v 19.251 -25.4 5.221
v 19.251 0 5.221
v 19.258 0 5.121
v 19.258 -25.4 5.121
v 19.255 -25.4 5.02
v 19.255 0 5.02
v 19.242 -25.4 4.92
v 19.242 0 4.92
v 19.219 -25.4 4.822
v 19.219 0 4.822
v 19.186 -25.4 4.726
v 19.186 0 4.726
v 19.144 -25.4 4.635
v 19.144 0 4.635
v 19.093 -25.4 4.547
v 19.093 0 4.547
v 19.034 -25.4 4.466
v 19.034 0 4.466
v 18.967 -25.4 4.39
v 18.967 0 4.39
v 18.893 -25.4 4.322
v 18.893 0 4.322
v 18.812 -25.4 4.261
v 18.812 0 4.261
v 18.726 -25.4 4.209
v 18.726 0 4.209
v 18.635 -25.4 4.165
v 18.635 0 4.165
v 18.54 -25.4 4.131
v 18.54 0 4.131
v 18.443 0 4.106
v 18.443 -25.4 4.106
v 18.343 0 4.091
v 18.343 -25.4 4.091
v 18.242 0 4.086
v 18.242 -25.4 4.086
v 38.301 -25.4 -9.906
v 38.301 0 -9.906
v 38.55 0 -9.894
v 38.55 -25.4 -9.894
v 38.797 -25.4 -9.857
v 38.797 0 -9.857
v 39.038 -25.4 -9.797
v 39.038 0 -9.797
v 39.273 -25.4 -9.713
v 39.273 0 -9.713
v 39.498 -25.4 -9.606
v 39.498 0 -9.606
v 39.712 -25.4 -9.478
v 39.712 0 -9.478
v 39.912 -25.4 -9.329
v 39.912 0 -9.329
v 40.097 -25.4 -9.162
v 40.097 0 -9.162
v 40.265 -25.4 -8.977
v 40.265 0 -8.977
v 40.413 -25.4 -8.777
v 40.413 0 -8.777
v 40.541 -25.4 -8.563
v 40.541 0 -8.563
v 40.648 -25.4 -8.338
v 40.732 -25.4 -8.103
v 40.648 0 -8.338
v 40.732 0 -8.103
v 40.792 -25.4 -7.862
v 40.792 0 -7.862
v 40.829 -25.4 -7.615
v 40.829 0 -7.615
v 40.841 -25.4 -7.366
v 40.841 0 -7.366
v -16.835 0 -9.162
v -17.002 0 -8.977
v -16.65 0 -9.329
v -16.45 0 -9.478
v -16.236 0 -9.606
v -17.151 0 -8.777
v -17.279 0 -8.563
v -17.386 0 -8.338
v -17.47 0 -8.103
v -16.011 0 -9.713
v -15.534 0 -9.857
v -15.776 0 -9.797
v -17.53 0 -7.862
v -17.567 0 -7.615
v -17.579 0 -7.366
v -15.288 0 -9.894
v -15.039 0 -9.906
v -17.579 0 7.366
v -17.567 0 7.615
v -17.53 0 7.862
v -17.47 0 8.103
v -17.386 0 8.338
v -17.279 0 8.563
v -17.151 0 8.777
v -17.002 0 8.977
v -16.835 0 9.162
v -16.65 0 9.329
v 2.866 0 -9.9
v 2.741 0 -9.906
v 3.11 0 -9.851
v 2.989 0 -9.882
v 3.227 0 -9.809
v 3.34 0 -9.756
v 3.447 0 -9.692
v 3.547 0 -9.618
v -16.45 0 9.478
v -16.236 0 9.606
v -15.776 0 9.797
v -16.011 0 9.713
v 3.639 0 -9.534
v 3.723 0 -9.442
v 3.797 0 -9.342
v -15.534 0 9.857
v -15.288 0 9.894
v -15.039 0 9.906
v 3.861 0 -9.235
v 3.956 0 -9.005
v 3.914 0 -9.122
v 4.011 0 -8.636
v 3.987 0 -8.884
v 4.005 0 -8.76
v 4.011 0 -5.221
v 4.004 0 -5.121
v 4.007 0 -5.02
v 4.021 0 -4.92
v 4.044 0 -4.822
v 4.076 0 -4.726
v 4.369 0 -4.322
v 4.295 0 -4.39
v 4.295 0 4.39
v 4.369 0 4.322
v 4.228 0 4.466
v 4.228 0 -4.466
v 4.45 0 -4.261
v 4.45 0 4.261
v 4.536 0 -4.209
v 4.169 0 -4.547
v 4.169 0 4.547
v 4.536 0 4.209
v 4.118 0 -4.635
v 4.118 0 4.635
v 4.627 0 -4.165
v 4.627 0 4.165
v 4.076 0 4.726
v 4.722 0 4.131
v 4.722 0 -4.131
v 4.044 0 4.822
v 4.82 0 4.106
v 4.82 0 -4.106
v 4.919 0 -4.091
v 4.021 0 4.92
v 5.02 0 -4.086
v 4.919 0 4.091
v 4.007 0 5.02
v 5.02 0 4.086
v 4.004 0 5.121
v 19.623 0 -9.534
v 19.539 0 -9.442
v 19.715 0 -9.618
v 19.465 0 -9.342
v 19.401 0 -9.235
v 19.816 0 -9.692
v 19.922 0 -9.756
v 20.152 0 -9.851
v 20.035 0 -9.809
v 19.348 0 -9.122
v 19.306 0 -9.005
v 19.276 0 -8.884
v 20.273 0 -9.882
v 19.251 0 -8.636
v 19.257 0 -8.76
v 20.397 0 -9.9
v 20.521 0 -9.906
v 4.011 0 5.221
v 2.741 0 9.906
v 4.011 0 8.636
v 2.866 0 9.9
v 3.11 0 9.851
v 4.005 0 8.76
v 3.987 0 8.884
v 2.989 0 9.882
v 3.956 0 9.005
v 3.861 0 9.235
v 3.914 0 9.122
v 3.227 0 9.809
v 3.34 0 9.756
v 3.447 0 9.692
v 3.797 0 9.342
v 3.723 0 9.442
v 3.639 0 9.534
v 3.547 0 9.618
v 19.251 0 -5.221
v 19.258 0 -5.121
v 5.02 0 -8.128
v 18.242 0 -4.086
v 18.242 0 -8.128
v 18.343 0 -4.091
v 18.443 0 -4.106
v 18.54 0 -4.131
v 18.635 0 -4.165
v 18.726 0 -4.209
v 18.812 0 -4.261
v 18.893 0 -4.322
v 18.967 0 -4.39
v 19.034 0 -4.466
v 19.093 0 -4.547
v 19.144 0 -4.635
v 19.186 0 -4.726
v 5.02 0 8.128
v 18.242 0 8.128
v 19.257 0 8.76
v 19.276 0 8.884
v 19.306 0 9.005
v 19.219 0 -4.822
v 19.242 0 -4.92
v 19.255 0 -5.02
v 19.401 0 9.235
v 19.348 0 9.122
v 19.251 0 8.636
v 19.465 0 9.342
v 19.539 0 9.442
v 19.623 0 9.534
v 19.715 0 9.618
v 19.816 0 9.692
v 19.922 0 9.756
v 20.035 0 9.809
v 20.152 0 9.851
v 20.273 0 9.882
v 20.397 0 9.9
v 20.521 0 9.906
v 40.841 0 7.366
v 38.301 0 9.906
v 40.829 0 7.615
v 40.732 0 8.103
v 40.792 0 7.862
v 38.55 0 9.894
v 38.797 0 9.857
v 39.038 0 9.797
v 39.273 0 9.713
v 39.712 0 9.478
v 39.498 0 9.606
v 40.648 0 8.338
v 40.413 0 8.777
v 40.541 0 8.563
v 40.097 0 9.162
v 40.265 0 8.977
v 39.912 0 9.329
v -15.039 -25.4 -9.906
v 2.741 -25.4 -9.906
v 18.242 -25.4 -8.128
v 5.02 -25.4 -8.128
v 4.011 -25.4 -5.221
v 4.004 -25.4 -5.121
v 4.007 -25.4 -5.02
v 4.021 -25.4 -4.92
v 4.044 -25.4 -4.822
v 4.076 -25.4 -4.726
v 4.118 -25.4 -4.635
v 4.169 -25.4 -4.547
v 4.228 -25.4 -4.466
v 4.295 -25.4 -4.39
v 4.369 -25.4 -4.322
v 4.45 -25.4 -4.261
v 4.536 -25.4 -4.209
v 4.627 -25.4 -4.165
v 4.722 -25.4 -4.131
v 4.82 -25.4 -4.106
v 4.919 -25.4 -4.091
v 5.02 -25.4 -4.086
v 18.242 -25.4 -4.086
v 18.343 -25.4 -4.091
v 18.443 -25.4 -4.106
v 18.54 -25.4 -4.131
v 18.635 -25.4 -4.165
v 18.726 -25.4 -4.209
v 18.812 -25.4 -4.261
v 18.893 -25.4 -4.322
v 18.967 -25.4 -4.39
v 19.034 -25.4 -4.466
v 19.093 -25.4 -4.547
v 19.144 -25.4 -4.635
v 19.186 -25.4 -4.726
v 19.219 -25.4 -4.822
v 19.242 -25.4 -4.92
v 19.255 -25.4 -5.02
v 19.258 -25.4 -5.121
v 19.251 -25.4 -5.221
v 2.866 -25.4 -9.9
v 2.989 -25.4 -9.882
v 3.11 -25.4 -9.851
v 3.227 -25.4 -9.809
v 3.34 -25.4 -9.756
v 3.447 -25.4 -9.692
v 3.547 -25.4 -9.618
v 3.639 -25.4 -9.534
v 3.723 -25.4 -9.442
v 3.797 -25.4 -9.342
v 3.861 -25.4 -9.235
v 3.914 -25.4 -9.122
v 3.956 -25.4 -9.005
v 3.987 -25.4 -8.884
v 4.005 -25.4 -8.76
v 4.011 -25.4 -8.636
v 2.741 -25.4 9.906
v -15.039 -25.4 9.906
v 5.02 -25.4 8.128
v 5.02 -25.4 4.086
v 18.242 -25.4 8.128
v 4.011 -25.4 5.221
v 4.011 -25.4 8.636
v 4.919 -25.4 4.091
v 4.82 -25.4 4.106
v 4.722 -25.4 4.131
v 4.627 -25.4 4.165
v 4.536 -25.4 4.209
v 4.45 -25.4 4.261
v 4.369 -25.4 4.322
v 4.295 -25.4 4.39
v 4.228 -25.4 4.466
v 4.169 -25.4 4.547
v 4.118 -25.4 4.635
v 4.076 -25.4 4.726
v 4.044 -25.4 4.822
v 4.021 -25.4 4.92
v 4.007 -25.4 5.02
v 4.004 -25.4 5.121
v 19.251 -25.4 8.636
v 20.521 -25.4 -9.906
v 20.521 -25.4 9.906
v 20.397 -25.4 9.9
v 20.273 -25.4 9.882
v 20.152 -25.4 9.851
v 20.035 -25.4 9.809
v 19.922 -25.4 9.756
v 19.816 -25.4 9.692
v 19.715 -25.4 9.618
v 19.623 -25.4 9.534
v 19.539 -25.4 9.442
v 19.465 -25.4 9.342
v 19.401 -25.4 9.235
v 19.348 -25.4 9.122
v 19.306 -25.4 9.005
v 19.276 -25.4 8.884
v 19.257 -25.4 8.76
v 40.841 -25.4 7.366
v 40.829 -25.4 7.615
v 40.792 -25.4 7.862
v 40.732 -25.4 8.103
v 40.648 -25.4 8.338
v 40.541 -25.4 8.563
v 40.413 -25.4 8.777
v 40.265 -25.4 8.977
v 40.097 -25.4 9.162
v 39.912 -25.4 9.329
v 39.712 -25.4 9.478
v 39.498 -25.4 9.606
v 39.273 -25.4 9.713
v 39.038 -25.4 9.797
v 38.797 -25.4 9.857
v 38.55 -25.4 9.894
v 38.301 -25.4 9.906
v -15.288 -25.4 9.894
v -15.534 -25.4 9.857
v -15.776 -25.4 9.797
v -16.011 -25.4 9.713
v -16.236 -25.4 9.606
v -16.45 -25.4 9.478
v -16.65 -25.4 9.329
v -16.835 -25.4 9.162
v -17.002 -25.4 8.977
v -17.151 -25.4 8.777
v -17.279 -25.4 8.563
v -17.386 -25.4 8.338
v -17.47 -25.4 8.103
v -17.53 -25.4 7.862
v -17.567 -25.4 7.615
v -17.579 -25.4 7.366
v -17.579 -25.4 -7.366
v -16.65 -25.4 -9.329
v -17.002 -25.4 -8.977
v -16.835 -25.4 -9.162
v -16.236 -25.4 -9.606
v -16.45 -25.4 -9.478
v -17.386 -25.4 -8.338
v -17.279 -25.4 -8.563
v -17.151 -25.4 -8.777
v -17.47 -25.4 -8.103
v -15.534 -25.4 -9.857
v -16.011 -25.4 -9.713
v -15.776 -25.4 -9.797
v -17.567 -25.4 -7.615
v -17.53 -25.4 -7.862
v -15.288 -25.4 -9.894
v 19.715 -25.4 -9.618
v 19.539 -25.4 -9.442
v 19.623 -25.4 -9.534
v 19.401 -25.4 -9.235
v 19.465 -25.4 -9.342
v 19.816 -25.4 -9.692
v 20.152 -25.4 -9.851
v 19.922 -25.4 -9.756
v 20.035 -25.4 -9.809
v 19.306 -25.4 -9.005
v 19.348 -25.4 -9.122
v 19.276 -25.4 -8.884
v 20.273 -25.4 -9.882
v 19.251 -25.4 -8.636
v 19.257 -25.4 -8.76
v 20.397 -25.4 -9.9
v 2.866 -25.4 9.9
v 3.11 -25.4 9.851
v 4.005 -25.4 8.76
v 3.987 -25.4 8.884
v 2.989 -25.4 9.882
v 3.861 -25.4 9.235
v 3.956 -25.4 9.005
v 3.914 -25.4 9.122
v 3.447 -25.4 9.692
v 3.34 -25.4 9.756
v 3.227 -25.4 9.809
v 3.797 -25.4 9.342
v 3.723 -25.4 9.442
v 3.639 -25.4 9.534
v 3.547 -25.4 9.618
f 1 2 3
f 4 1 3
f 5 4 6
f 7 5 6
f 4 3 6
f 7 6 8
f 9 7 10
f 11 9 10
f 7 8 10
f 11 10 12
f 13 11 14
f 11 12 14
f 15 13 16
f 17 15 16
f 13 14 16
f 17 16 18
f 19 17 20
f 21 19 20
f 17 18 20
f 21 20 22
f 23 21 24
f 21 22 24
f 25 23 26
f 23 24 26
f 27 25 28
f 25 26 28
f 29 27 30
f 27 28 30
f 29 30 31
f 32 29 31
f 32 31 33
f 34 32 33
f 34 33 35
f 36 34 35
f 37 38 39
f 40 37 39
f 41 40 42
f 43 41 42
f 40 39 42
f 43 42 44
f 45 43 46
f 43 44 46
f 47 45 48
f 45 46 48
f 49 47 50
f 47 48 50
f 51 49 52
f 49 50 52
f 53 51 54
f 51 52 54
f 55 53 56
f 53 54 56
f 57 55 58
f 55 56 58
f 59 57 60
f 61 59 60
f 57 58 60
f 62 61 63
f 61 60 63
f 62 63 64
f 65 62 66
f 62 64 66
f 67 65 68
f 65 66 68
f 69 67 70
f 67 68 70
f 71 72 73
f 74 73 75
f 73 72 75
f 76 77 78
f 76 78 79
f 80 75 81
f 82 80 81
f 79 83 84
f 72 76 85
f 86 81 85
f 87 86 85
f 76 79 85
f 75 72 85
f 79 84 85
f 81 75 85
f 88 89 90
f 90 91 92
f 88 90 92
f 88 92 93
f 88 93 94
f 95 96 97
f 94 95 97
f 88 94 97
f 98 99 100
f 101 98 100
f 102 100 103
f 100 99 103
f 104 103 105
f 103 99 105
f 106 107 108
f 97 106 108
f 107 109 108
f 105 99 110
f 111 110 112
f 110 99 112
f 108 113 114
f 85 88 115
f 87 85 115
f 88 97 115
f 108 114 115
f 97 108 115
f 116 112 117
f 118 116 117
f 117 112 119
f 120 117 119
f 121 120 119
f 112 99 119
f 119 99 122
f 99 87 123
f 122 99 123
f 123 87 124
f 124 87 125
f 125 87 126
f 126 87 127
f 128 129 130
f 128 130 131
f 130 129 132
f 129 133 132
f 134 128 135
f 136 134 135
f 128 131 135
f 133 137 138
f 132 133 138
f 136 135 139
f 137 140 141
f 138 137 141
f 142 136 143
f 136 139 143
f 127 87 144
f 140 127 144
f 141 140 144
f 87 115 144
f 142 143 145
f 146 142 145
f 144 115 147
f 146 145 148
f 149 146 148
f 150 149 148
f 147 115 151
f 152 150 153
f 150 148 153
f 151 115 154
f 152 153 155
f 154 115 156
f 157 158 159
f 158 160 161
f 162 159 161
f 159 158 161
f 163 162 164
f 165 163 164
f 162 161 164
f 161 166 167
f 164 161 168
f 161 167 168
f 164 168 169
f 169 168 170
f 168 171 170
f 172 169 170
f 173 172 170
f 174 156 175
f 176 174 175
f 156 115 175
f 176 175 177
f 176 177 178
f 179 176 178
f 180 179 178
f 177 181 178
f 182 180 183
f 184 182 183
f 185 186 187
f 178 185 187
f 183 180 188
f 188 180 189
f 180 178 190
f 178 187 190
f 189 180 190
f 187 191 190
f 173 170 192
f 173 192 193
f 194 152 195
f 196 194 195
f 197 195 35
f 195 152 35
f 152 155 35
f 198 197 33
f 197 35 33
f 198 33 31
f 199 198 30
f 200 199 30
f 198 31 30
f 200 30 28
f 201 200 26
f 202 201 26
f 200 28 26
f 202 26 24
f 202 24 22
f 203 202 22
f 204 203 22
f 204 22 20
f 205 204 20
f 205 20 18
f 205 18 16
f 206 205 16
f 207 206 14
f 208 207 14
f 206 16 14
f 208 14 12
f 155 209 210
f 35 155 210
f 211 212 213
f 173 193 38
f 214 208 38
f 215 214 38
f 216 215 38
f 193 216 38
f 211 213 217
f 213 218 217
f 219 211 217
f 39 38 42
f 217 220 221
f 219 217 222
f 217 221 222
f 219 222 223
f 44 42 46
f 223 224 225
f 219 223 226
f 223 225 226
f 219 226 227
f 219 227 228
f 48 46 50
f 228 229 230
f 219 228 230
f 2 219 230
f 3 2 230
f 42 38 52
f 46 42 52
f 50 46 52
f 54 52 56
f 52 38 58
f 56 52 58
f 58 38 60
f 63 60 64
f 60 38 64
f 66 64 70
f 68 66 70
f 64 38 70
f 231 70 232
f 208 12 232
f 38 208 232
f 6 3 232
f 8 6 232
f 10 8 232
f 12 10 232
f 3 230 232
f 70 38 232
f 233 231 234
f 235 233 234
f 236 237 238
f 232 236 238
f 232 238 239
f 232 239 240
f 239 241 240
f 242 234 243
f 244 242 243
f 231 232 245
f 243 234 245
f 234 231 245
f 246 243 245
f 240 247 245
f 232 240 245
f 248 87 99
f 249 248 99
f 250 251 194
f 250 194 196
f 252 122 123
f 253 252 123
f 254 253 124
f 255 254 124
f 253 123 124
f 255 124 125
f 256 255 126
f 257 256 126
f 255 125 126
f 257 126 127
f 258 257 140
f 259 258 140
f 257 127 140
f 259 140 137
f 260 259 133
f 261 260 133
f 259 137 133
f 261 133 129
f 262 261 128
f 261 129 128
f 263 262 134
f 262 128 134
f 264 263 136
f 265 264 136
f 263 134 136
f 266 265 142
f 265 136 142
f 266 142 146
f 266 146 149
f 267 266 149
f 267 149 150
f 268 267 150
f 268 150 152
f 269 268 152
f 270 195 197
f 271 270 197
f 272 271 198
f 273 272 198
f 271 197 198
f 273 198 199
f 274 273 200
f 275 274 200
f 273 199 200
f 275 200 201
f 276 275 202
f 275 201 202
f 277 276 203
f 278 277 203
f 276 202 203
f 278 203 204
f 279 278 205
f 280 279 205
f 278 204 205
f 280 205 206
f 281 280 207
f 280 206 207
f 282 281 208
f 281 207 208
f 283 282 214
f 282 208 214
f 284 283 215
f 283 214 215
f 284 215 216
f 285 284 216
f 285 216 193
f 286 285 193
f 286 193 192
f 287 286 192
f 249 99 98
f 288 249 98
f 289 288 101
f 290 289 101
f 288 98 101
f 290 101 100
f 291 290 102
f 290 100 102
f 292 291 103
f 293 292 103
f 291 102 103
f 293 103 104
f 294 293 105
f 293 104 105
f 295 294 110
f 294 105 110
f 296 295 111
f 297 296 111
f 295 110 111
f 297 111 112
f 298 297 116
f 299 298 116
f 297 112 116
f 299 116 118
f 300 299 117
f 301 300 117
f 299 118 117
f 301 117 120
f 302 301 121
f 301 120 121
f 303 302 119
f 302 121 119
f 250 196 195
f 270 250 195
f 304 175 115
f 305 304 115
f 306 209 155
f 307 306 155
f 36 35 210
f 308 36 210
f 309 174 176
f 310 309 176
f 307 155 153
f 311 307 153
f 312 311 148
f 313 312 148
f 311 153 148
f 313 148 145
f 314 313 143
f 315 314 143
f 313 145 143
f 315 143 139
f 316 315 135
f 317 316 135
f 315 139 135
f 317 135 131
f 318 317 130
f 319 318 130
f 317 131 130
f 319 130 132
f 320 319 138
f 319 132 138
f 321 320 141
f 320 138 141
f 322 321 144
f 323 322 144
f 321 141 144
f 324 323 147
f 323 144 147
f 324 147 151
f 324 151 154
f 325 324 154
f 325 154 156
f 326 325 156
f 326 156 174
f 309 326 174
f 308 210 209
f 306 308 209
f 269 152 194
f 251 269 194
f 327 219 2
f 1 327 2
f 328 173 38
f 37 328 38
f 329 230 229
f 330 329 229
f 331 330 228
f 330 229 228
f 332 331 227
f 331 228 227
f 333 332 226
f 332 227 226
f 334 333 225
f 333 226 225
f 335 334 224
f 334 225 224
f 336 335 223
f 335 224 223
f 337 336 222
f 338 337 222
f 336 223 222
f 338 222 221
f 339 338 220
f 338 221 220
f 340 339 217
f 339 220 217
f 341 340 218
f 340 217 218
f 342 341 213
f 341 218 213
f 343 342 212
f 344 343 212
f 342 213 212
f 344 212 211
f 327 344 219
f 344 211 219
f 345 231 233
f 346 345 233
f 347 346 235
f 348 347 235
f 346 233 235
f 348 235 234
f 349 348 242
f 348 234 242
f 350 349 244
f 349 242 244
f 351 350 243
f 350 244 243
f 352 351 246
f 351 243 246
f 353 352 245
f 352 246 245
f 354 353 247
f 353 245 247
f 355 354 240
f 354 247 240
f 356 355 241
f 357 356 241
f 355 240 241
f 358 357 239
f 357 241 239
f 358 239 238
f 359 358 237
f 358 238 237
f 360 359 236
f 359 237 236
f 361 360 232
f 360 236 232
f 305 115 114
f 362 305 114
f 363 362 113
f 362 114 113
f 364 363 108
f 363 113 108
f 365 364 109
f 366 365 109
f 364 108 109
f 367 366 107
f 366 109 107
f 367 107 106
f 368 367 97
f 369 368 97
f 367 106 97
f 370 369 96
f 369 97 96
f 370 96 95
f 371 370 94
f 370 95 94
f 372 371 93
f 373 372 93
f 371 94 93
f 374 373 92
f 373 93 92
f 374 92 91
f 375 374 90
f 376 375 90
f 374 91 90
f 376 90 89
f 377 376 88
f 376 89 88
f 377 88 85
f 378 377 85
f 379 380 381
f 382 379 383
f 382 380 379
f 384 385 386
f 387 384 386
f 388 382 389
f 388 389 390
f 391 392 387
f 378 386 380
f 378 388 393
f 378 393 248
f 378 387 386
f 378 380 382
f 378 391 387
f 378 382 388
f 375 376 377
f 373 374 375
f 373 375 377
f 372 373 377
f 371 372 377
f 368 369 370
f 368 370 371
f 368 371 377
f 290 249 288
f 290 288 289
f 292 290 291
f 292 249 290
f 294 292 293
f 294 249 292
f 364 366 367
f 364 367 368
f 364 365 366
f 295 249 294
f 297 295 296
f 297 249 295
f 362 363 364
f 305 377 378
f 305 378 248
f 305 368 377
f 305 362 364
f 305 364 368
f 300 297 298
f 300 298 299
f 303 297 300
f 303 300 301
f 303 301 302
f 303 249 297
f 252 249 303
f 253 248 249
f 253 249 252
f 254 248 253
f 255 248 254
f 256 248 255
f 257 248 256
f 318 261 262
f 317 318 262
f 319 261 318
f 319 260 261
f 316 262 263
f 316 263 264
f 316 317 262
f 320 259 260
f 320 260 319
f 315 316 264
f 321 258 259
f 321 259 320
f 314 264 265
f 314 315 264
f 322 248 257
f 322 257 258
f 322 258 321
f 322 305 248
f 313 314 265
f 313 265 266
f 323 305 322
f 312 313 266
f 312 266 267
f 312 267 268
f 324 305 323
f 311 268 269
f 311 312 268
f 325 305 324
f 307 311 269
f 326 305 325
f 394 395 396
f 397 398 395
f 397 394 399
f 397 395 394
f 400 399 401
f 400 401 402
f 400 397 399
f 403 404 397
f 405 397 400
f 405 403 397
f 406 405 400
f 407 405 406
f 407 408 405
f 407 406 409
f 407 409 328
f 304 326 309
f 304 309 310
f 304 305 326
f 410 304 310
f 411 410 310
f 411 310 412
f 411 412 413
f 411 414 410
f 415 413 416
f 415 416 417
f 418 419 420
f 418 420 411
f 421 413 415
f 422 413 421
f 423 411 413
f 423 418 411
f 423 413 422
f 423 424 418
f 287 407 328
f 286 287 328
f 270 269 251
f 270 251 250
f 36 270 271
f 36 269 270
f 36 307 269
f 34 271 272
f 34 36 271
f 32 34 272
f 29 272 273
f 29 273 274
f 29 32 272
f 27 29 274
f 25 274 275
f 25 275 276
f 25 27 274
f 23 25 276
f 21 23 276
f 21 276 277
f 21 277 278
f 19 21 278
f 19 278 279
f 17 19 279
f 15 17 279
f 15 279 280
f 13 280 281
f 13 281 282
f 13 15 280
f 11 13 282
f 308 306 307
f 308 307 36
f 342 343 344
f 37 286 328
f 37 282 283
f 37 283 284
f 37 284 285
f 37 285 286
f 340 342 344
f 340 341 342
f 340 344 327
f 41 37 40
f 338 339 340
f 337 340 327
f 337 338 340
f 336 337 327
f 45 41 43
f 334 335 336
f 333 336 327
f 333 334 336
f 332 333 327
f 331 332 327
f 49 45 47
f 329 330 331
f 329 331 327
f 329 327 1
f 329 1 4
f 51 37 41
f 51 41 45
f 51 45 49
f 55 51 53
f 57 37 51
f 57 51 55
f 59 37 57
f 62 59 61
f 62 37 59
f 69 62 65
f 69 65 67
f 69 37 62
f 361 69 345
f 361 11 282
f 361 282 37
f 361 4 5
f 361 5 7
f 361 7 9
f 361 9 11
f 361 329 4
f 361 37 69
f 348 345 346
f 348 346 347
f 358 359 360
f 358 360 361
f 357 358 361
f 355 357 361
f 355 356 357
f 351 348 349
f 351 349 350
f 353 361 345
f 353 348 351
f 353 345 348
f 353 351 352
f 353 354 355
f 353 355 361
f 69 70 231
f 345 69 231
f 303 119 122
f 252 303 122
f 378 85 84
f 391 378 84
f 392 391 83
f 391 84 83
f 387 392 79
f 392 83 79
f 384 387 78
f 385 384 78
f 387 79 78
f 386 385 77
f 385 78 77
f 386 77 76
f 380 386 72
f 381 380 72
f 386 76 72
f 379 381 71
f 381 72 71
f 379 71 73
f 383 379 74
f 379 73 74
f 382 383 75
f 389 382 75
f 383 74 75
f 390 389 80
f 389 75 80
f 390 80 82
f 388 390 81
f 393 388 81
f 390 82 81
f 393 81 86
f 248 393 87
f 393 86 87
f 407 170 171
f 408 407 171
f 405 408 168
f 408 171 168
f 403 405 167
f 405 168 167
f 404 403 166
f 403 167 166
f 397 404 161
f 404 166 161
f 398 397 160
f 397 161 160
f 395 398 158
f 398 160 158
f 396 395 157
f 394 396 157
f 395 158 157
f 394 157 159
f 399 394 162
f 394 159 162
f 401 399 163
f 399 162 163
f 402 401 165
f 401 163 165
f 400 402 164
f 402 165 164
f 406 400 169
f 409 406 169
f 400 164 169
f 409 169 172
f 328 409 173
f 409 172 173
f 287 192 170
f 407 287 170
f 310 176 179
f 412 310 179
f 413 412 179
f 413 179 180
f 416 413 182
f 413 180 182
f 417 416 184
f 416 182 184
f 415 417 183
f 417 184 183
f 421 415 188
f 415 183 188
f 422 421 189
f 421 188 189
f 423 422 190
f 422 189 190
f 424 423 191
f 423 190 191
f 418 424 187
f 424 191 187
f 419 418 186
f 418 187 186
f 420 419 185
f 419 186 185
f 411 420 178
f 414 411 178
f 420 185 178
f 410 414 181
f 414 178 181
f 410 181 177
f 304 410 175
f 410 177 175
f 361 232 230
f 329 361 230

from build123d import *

# Parameters (mm, degrees)
F1_DEPTH = 25.4


with BuildPart() as f1:
    # F0 (on Front) → F1 (new body)
    with BuildSketch(Plane.XZ):
        with BuildLine():
            Line((-17.578895, 7.366), (-17.578895, 0))
            Line((-17.578895, 0), (-17.578895, -7.366))
            ThreePointArc((-17.578895, -7.366), (-16.834947, -9.162051), (-15.038895, -9.906))
            Line((-15.038895, -9.906), (2.741105, -9.906))
            ThreePointArc((2.741105, -9.906), (3.63913, -9.534026), (4.011105, -8.636))
            Line((4.011105, -8.636), (4.011105, -5.221252))
            ThreePointArc((4.011105, -5.221252), (4.2608, -4.427238), (5.020116, -4.086291))
            Line((5.020116, -4.086291), (5.020116, -8.128))
            Line((5.020116, -8.128), (11.631105, -8.128))
            Line((11.631105, -8.128), (18.242093, -8.128))
            Line((18.242093, -8.128), (18.242093, -4.086291))
            ThreePointArc((18.242093, -4.086291), (19.001409, -4.427238), (19.251105, -5.221252))
            Line((19.251105, -5.221252), (19.251105, -8.636))
            ThreePointArc((19.251105, -8.636), (19.623079, -9.534026), (20.521105, -9.906))
            Line((20.521105, -9.906), (38.301105, -9.906))
            ThreePointArc((38.301105, -9.906), (40.097156, -9.162051), (40.841105, -7.366))
            Line((40.841105, -7.366), (40.841105, 0))
            Line((40.841105, 0), (40.841105, 7.366))
            ThreePointArc((40.841105, 7.366), (40.097156, 9.162051), (38.301105, 9.906))
            Line((38.301105, 9.906), (20.521105, 9.906))
            ThreePointArc((20.521105, 9.906), (19.623079, 9.534026), (19.251105, 8.636))
            Line((19.251105, 8.636), (19.251105, 5.221252))
            ThreePointArc((19.251105, 5.221252), (19.001409, 4.427238), (18.242093, 4.086291))
            Line((18.242093, 4.086291), (18.242093, 8.128))
            Line((18.242093, 8.128), (11.631105, 8.128))
            Line((11.631105, 8.128), (5.020116, 8.128))
            Line((5.020116, 8.128), (5.020116, 4.086291))
            ThreePointArc((5.020116, 4.086291), (4.2608, 4.427238), (4.011105, 5.221252))
            Line((4.011105, 5.221252), (4.011105, 8.636))
            ThreePointArc((4.011105, 8.636), (3.63913, 9.534026), (2.741105, 9.906))
            Line((2.741105, 9.906), (-15.038895, 9.906))
            ThreePointArc((-15.038895, 9.906), (-16.834947, 9.162051), (-17.578895, 7.366))
        make_face()
    extrude(amount=F1_DEPTH)


solid = f1.part
